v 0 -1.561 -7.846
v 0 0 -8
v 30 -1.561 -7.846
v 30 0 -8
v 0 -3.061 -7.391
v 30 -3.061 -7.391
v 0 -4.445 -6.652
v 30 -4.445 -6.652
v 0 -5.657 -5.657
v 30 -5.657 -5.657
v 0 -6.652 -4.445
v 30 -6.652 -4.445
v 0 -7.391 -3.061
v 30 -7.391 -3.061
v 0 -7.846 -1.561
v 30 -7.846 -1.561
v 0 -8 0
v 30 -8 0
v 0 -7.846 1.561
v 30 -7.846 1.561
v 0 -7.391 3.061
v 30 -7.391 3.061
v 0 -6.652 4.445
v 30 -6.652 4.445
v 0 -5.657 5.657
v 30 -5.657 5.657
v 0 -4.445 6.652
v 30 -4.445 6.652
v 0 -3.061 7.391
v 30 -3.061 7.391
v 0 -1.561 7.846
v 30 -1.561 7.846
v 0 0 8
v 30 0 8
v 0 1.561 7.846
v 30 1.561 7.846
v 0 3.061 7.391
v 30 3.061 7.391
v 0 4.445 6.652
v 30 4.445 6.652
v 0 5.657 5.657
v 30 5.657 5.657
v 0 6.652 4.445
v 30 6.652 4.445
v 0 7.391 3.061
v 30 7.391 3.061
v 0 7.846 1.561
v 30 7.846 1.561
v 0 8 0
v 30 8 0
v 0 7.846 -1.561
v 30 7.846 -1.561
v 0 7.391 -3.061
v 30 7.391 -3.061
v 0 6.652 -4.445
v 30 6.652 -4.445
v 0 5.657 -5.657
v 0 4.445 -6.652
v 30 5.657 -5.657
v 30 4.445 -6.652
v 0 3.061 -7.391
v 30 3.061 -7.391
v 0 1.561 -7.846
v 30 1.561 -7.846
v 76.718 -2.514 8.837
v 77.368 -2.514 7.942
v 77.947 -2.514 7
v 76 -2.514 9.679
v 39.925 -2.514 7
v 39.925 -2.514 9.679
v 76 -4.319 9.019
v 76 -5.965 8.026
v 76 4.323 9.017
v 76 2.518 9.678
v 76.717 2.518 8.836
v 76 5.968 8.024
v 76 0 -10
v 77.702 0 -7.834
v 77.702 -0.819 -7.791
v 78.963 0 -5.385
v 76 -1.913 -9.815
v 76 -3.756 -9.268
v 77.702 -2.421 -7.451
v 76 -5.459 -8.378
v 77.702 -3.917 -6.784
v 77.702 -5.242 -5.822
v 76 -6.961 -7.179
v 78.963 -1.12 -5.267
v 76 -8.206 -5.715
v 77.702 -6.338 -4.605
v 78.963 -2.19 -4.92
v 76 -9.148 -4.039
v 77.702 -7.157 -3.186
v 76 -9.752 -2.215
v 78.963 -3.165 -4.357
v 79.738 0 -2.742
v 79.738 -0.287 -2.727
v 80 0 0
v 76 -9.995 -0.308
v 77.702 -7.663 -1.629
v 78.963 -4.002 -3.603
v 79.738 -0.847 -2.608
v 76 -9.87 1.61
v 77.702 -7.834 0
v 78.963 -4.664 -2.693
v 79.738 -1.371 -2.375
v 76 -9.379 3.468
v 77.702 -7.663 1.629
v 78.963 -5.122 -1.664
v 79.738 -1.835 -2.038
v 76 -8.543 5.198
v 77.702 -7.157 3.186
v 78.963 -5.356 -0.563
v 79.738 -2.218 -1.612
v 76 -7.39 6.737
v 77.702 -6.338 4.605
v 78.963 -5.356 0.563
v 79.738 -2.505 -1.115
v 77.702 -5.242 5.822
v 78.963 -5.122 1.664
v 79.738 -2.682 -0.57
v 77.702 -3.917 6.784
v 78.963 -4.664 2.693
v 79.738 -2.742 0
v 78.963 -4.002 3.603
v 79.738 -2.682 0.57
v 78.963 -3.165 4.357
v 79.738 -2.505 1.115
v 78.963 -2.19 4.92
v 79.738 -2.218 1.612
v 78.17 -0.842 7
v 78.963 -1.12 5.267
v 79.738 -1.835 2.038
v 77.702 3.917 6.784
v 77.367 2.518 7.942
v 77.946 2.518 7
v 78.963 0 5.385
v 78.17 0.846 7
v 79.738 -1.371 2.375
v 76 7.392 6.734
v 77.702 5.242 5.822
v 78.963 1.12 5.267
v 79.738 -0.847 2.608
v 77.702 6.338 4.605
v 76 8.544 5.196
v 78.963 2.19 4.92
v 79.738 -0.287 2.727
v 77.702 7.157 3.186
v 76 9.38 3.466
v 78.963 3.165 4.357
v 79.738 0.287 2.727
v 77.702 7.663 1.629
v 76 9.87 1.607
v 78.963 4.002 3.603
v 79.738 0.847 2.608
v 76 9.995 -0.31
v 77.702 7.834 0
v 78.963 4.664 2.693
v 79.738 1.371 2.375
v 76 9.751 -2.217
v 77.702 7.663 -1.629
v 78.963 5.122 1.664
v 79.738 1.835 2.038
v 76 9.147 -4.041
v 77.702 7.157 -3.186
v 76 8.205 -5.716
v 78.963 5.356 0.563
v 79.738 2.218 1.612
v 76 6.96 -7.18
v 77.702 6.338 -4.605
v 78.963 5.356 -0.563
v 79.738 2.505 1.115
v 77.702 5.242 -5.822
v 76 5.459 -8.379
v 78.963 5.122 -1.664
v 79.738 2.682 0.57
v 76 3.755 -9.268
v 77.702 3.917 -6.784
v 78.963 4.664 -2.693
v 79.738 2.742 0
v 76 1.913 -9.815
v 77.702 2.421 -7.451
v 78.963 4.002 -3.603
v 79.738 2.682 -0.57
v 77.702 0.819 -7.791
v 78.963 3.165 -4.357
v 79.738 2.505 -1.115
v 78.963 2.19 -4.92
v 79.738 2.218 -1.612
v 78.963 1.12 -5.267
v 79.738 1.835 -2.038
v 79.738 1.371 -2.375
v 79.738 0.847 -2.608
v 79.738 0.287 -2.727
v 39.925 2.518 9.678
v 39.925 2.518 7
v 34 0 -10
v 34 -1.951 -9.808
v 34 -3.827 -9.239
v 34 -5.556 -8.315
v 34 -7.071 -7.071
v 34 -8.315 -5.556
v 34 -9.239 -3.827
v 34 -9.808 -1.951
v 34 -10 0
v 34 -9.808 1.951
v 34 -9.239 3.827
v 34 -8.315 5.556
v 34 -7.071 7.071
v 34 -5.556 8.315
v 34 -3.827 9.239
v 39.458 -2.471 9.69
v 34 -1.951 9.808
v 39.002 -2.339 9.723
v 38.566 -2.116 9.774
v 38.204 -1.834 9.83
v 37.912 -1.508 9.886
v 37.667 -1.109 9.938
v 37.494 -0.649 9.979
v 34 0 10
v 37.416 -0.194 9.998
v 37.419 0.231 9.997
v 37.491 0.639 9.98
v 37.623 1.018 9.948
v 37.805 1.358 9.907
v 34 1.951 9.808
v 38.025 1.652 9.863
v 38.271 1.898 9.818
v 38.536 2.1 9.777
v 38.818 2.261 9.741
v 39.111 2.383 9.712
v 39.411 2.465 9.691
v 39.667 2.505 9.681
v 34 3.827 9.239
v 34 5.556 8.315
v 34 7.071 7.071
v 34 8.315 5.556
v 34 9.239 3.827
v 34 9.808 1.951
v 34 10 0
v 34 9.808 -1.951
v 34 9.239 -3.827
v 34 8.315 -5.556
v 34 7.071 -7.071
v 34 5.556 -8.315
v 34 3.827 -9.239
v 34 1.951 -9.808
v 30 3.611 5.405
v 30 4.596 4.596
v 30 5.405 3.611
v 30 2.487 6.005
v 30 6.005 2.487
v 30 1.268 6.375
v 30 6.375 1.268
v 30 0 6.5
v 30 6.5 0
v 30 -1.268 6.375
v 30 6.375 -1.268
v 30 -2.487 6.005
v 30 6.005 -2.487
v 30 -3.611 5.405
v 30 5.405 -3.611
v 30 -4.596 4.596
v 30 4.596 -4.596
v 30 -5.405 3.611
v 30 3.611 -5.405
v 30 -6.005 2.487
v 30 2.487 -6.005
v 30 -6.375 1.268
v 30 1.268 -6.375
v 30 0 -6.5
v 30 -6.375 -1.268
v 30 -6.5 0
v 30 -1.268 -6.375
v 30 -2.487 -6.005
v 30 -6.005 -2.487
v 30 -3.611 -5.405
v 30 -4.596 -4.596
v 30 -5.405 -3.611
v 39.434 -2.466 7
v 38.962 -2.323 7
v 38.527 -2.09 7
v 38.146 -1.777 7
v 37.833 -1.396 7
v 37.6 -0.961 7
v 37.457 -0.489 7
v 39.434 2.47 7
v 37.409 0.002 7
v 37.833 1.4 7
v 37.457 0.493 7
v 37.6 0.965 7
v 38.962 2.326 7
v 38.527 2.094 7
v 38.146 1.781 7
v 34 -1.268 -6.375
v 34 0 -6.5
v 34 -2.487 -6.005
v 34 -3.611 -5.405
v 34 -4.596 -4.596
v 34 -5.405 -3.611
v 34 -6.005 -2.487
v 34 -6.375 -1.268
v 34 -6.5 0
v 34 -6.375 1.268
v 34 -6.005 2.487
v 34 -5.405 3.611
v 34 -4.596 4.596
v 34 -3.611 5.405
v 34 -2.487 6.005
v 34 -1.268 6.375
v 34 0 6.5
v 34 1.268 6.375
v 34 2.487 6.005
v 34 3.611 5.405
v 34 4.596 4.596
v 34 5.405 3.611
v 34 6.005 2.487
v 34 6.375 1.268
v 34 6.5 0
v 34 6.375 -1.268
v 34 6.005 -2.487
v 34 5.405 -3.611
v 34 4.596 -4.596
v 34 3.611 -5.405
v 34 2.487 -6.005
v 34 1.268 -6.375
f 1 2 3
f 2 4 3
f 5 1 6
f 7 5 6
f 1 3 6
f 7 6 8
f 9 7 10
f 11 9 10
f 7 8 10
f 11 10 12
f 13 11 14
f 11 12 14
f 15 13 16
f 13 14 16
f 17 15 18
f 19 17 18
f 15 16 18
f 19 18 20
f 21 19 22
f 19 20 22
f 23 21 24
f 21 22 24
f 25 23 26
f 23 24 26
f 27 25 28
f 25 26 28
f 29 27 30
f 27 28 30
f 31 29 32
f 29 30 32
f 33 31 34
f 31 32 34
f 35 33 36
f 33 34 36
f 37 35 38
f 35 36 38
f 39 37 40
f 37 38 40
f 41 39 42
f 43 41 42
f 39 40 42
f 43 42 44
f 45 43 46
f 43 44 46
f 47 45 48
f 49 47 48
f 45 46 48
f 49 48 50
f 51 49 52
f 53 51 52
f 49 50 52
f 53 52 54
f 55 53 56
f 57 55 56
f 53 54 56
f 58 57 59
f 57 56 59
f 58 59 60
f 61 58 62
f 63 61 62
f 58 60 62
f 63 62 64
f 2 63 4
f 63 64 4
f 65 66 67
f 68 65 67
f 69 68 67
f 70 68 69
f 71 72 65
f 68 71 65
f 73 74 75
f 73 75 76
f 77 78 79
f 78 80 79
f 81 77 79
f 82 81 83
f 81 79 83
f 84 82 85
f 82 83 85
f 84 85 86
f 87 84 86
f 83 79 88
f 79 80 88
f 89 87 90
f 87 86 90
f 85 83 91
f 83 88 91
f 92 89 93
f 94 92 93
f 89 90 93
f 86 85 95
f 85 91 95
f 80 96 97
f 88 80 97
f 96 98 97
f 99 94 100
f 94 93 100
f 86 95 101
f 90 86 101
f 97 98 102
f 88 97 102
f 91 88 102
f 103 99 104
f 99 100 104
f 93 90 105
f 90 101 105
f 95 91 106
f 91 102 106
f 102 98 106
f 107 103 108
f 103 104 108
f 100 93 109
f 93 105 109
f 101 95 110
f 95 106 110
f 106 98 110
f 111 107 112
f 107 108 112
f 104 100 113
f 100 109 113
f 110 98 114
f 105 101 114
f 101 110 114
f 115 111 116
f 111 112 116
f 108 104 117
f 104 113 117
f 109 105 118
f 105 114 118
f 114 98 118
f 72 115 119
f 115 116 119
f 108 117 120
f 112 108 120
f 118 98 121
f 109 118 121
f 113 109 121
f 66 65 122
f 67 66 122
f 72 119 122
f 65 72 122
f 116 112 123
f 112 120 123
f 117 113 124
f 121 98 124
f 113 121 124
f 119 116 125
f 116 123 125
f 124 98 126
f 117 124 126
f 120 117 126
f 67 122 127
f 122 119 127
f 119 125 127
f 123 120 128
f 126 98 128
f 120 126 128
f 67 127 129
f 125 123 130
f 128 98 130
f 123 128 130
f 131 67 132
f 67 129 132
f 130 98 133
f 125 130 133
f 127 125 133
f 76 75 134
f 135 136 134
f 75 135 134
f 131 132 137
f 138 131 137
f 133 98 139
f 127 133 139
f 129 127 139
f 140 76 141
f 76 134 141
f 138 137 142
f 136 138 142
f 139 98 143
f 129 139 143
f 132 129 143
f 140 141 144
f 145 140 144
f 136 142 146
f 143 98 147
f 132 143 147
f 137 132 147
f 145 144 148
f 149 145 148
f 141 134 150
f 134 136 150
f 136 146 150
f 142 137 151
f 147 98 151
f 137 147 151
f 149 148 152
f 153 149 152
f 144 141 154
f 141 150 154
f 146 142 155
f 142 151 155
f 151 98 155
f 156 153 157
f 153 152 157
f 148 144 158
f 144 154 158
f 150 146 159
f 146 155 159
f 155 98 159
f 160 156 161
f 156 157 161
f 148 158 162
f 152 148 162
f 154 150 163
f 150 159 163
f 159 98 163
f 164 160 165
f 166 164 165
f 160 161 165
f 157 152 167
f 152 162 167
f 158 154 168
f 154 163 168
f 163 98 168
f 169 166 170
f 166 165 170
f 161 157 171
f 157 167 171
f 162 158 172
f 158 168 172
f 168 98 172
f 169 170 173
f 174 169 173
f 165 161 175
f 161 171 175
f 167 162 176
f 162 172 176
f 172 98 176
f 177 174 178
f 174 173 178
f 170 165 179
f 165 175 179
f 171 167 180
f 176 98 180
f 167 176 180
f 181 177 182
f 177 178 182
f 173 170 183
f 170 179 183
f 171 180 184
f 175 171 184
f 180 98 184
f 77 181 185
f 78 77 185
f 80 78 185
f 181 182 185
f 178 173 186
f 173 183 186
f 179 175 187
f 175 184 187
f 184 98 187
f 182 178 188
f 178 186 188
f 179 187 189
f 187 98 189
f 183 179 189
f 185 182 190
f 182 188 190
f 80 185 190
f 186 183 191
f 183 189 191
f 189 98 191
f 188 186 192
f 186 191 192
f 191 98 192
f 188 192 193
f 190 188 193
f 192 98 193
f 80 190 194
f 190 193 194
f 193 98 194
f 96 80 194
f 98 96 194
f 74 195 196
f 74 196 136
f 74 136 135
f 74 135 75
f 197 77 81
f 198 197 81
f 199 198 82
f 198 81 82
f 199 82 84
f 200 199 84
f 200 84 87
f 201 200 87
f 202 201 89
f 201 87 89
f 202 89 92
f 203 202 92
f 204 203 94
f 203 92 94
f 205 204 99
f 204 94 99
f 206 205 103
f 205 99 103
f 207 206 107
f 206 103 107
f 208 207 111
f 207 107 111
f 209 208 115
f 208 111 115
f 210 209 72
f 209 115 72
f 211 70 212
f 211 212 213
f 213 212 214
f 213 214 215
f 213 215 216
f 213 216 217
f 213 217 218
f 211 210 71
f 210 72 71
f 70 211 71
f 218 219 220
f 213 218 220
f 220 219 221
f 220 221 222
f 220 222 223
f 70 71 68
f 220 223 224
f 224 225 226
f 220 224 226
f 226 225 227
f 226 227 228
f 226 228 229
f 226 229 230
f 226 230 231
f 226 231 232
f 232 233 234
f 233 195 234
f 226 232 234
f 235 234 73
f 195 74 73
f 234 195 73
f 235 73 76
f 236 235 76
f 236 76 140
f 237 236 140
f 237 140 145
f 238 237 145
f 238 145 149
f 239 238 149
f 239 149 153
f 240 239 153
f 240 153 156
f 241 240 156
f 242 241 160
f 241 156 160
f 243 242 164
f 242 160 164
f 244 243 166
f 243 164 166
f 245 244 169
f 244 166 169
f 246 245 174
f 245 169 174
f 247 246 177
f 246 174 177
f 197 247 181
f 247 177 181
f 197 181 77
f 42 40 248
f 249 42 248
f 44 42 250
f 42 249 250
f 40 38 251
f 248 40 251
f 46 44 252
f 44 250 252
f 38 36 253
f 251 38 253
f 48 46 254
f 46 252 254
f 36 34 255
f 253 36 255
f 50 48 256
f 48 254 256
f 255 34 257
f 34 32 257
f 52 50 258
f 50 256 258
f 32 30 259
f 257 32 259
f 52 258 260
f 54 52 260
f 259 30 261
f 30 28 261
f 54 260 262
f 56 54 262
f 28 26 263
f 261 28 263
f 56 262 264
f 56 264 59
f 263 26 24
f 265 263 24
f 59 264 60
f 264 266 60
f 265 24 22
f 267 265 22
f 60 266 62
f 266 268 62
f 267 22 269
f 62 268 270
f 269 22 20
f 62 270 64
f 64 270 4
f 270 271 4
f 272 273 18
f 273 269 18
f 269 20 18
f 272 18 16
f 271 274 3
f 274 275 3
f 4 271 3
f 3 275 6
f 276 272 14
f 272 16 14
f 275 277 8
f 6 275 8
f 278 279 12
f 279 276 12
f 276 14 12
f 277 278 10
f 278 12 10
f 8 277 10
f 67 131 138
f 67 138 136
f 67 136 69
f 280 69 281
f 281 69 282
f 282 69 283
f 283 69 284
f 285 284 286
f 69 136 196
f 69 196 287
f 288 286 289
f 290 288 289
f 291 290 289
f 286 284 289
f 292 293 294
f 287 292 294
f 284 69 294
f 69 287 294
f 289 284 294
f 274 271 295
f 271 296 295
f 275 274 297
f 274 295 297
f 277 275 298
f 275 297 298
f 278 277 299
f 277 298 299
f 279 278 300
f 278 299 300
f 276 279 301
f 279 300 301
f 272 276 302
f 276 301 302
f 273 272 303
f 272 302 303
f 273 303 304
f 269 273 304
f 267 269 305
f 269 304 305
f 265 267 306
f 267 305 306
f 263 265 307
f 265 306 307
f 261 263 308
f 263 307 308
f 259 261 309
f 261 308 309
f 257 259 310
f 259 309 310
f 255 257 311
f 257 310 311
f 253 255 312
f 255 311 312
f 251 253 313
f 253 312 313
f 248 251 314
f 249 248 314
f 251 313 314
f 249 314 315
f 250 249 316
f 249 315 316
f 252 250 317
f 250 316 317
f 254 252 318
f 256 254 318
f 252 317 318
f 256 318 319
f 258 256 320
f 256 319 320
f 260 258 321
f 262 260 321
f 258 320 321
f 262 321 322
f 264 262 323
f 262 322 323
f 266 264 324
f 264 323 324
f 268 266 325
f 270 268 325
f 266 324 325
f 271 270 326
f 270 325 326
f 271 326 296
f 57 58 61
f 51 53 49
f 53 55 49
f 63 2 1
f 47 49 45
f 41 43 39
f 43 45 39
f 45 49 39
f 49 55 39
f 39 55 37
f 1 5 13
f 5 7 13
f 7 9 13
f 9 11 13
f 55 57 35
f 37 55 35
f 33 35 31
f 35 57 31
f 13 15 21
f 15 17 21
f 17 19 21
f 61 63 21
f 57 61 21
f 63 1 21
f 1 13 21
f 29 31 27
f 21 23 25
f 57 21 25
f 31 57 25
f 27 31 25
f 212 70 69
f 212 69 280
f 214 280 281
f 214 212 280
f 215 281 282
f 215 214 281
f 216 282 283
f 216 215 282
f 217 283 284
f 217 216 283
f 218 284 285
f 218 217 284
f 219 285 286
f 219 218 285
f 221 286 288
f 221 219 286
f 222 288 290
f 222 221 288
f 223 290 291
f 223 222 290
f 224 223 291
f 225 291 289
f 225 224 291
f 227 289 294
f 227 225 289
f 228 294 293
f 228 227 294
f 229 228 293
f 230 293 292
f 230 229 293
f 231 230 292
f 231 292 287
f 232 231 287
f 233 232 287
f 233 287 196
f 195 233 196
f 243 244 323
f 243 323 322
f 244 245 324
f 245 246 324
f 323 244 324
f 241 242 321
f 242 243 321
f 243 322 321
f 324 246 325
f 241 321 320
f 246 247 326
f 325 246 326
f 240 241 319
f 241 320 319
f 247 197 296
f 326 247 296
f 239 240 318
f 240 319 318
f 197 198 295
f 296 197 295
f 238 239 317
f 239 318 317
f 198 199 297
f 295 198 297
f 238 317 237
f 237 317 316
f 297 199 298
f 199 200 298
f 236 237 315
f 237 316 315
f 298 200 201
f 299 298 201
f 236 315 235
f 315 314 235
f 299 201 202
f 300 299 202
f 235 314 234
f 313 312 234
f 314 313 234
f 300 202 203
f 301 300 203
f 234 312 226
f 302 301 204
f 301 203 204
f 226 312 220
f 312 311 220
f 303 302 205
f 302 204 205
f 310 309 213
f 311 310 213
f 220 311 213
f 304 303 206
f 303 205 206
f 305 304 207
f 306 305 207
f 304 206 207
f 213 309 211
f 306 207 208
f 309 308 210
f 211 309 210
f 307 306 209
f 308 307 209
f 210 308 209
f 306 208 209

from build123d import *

# Parameters (mm, degrees)
ENL_V_MAT_EXTRU_1_DEPTH = 3


with BuildPart() as part:
    # Esquisse1 → Révolution1 (revolve)
    with BuildSketch(Plane.XY, mode=Mode.PRIVATE) as r_volution1_sk:
        with BuildLine():
            Line((80, 0), (0, 0))
            Line((0, 0), (0, 8))
            Line((0, 8), (30, 8))
            Line((30, 8), (30, 6.5))
            Line((30, 6.5), (34, 6.5))
            Line((34, 6.5), (34, 10))
            Line((34, 10), (76, 10))
            ThreePointArc((76, 10), (78.962912018, 5.385164807), (80, 0))
        make_face()
    revolve(r_volution1_sk.sketch.rotate(Axis((80, 0, 0), (-1, 0, 0)), 90), axis=Axis((80, 0, 0), (-1, 0, 0)))

    # Esquisse2 → Enlèv. mat.-Extru.1 (cut)
    with BuildSketch(Plane.XY.offset(10)):
        with BuildLine():
            Line((39.924742885, 2.51802815), (89.396583104, 2.51802815))
            Line((89.396583104, 2.51802815), (89.396583104, -2.514235284))
            Line((89.396583104, -2.514235284), (39.924742885, -2.514235284))
            ThreePointArc((39.924742885, -2.514235284), (37.408611168, 0.001896433), (39.924742885, 2.51802815))
        make_face()
    extrude(amount=-ENL_V_MAT_EXTRU_1_DEPTH, mode=Mode.SUBTRACT)


solid = part.part
